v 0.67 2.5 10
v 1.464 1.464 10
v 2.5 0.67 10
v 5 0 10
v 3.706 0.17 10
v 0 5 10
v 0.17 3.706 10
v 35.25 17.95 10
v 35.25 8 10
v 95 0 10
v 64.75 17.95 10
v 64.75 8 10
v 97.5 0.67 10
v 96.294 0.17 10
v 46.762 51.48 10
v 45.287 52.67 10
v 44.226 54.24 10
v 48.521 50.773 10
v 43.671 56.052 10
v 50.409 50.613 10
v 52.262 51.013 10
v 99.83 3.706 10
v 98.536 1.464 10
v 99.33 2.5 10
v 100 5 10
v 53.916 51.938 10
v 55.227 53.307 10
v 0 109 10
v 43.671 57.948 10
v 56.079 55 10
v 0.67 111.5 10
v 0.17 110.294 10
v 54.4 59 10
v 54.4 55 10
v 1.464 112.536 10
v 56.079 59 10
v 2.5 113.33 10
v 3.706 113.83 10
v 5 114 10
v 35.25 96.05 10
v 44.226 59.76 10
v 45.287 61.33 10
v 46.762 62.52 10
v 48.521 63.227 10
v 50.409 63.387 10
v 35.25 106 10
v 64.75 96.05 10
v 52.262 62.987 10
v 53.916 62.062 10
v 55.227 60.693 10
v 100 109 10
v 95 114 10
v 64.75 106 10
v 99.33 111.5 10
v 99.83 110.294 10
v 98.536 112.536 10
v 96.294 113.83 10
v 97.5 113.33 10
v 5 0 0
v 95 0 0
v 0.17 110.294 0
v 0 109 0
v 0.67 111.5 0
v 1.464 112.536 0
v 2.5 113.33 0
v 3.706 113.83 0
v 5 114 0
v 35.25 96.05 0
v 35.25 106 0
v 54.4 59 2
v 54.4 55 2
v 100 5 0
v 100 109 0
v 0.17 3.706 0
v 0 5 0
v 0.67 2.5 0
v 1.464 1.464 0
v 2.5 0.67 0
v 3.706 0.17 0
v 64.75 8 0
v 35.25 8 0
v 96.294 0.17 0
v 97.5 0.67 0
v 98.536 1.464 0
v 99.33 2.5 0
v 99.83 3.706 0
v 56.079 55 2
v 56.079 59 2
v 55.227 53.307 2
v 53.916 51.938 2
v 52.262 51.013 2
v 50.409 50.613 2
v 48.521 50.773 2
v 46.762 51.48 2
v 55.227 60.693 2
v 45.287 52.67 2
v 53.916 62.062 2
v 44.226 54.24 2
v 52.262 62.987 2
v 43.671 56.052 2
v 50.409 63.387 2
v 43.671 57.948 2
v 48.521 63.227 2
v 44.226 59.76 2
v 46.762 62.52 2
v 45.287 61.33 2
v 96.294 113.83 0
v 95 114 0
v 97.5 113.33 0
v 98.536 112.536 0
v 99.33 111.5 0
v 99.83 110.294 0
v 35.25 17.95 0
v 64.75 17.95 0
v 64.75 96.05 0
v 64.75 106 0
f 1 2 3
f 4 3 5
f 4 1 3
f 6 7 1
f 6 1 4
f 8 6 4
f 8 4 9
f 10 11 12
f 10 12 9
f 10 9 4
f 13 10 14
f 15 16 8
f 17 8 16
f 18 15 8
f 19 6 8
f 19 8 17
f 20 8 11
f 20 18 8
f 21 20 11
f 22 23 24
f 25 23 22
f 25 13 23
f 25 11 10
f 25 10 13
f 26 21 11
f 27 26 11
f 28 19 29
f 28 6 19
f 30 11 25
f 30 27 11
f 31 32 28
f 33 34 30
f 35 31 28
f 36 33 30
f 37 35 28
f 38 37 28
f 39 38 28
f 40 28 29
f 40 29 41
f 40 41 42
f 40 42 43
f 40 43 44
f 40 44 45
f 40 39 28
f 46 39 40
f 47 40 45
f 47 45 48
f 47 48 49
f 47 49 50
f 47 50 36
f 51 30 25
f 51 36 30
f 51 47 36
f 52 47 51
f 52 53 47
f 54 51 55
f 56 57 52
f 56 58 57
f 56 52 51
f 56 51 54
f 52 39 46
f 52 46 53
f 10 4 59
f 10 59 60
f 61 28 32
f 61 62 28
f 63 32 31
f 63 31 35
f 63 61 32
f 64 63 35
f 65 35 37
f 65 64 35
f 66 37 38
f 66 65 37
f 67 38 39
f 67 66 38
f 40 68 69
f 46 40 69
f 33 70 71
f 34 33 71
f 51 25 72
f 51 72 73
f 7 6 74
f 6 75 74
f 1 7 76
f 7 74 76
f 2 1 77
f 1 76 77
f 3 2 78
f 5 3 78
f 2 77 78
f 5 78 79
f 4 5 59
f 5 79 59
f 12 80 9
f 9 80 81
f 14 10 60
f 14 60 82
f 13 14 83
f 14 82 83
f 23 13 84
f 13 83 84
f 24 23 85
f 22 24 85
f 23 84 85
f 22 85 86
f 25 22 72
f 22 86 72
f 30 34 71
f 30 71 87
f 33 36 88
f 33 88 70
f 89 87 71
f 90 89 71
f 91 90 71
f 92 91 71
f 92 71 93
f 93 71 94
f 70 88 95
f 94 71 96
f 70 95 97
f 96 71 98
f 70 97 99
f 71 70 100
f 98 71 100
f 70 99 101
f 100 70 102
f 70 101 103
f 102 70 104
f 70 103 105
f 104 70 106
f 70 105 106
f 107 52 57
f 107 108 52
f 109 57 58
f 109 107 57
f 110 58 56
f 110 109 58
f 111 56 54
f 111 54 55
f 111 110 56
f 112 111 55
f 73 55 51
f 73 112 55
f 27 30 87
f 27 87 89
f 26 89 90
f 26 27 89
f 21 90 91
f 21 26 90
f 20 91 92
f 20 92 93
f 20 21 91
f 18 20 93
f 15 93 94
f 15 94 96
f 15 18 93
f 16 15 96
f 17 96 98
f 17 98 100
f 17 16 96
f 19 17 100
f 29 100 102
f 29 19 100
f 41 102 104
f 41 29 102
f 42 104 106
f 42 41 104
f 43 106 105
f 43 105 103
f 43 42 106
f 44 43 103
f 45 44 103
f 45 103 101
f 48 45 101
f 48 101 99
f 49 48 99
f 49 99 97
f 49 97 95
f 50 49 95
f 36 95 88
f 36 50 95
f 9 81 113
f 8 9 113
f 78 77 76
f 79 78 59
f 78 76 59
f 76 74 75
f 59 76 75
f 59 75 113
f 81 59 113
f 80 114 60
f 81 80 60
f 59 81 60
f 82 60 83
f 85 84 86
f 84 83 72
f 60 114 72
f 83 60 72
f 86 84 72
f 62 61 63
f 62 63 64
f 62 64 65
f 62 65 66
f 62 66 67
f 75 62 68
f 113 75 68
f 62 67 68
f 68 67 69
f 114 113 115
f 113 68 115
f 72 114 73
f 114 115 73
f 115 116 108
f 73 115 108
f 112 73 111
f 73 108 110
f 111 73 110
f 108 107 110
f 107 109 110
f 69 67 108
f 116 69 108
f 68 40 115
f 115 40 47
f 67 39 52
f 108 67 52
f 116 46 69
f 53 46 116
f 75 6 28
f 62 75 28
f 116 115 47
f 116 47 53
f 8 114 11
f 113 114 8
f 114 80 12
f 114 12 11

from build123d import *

# Parameters (mm, degrees)
IZIM1_W                     = 100
IZIM1_H                     = 114
Y_KSEKLIK_EKSTR_ZYON1_DEPTH = 10
IZIM2_W                     = 29.5
IZIM2_H                     = 9.95
KES_EKSTR_ZYON1_DEPTH       = 152.973681932
IZIM3_W                     = 29.5
IZIM3_H                     = 9.95
KES_EKSTR_ZYON2_DEPTH       = 152.973681932
RADYUS1_R                   = 5
KES_EKSTR_ZYON3_DEPTH       = 8


with BuildPart() as part:
    # Çizim1 → Yükseklik-Ekstrüzyon1 (new body)
    with BuildSketch(Plane.XY.offset(10)):
        with Locations((50, 57)):
            Rectangle(IZIM1_W, IZIM1_H)
    extrude(amount=-Y_KSEKLIK_EKSTR_ZYON1_DEPTH)

    # Çizim2 → Kes-Ekstrüzyon1 (cut, through all)
    with BuildSketch(Plane.XY.offset(10)):
        with Locations((50, 101.025)):
            Rectangle(IZIM2_W, IZIM2_H)
    extrude(amount=-KES_EKSTR_ZYON1_DEPTH, mode=Mode.SUBTRACT)

    # Çizim3 → Kes-Ekstrüzyon2 (cut, through all)
    with BuildSketch(Plane(origin=(0, 0, 0), x_dir=(-1, 0, 0), z_dir=(0, 0, -1))):
        with Locations((-50, 12.975)):
            Rectangle(IZIM3_W, IZIM3_H)
    extrude(amount=-KES_EKSTR_ZYON2_DEPTH, mode=Mode.SUBTRACT)

    # Radyus1
    radyus1_edges = [part.edges().sort_by_distance(p)[0] for p in [
        (0, 114, 5),
        (100, 114, 5),
        (100, 0, 5),
        (0, 0, 5),
    ]]
    fillet(radyus1_edges, radius=RADYUS1_R)

    # Çizim14 → Kes-Ekstrüzyon3 (cut)
    with BuildSketch(Plane.XY.offset(10)):
        with BuildLine():
            Line((54.4, 59), (54.4, 55))
            Line((54.4, 55), (56.079473661, 55))
            ThreePointArc((56.079473661, 55), (43.6, 57), (56.079473661, 59))
            Line((56.079473661, 59), (54.4, 59))
        make_face()
    extrude(amount=-KES_EKSTR_ZYON3_DEPTH, mode=Mode.SUBTRACT)


solid = part.part
